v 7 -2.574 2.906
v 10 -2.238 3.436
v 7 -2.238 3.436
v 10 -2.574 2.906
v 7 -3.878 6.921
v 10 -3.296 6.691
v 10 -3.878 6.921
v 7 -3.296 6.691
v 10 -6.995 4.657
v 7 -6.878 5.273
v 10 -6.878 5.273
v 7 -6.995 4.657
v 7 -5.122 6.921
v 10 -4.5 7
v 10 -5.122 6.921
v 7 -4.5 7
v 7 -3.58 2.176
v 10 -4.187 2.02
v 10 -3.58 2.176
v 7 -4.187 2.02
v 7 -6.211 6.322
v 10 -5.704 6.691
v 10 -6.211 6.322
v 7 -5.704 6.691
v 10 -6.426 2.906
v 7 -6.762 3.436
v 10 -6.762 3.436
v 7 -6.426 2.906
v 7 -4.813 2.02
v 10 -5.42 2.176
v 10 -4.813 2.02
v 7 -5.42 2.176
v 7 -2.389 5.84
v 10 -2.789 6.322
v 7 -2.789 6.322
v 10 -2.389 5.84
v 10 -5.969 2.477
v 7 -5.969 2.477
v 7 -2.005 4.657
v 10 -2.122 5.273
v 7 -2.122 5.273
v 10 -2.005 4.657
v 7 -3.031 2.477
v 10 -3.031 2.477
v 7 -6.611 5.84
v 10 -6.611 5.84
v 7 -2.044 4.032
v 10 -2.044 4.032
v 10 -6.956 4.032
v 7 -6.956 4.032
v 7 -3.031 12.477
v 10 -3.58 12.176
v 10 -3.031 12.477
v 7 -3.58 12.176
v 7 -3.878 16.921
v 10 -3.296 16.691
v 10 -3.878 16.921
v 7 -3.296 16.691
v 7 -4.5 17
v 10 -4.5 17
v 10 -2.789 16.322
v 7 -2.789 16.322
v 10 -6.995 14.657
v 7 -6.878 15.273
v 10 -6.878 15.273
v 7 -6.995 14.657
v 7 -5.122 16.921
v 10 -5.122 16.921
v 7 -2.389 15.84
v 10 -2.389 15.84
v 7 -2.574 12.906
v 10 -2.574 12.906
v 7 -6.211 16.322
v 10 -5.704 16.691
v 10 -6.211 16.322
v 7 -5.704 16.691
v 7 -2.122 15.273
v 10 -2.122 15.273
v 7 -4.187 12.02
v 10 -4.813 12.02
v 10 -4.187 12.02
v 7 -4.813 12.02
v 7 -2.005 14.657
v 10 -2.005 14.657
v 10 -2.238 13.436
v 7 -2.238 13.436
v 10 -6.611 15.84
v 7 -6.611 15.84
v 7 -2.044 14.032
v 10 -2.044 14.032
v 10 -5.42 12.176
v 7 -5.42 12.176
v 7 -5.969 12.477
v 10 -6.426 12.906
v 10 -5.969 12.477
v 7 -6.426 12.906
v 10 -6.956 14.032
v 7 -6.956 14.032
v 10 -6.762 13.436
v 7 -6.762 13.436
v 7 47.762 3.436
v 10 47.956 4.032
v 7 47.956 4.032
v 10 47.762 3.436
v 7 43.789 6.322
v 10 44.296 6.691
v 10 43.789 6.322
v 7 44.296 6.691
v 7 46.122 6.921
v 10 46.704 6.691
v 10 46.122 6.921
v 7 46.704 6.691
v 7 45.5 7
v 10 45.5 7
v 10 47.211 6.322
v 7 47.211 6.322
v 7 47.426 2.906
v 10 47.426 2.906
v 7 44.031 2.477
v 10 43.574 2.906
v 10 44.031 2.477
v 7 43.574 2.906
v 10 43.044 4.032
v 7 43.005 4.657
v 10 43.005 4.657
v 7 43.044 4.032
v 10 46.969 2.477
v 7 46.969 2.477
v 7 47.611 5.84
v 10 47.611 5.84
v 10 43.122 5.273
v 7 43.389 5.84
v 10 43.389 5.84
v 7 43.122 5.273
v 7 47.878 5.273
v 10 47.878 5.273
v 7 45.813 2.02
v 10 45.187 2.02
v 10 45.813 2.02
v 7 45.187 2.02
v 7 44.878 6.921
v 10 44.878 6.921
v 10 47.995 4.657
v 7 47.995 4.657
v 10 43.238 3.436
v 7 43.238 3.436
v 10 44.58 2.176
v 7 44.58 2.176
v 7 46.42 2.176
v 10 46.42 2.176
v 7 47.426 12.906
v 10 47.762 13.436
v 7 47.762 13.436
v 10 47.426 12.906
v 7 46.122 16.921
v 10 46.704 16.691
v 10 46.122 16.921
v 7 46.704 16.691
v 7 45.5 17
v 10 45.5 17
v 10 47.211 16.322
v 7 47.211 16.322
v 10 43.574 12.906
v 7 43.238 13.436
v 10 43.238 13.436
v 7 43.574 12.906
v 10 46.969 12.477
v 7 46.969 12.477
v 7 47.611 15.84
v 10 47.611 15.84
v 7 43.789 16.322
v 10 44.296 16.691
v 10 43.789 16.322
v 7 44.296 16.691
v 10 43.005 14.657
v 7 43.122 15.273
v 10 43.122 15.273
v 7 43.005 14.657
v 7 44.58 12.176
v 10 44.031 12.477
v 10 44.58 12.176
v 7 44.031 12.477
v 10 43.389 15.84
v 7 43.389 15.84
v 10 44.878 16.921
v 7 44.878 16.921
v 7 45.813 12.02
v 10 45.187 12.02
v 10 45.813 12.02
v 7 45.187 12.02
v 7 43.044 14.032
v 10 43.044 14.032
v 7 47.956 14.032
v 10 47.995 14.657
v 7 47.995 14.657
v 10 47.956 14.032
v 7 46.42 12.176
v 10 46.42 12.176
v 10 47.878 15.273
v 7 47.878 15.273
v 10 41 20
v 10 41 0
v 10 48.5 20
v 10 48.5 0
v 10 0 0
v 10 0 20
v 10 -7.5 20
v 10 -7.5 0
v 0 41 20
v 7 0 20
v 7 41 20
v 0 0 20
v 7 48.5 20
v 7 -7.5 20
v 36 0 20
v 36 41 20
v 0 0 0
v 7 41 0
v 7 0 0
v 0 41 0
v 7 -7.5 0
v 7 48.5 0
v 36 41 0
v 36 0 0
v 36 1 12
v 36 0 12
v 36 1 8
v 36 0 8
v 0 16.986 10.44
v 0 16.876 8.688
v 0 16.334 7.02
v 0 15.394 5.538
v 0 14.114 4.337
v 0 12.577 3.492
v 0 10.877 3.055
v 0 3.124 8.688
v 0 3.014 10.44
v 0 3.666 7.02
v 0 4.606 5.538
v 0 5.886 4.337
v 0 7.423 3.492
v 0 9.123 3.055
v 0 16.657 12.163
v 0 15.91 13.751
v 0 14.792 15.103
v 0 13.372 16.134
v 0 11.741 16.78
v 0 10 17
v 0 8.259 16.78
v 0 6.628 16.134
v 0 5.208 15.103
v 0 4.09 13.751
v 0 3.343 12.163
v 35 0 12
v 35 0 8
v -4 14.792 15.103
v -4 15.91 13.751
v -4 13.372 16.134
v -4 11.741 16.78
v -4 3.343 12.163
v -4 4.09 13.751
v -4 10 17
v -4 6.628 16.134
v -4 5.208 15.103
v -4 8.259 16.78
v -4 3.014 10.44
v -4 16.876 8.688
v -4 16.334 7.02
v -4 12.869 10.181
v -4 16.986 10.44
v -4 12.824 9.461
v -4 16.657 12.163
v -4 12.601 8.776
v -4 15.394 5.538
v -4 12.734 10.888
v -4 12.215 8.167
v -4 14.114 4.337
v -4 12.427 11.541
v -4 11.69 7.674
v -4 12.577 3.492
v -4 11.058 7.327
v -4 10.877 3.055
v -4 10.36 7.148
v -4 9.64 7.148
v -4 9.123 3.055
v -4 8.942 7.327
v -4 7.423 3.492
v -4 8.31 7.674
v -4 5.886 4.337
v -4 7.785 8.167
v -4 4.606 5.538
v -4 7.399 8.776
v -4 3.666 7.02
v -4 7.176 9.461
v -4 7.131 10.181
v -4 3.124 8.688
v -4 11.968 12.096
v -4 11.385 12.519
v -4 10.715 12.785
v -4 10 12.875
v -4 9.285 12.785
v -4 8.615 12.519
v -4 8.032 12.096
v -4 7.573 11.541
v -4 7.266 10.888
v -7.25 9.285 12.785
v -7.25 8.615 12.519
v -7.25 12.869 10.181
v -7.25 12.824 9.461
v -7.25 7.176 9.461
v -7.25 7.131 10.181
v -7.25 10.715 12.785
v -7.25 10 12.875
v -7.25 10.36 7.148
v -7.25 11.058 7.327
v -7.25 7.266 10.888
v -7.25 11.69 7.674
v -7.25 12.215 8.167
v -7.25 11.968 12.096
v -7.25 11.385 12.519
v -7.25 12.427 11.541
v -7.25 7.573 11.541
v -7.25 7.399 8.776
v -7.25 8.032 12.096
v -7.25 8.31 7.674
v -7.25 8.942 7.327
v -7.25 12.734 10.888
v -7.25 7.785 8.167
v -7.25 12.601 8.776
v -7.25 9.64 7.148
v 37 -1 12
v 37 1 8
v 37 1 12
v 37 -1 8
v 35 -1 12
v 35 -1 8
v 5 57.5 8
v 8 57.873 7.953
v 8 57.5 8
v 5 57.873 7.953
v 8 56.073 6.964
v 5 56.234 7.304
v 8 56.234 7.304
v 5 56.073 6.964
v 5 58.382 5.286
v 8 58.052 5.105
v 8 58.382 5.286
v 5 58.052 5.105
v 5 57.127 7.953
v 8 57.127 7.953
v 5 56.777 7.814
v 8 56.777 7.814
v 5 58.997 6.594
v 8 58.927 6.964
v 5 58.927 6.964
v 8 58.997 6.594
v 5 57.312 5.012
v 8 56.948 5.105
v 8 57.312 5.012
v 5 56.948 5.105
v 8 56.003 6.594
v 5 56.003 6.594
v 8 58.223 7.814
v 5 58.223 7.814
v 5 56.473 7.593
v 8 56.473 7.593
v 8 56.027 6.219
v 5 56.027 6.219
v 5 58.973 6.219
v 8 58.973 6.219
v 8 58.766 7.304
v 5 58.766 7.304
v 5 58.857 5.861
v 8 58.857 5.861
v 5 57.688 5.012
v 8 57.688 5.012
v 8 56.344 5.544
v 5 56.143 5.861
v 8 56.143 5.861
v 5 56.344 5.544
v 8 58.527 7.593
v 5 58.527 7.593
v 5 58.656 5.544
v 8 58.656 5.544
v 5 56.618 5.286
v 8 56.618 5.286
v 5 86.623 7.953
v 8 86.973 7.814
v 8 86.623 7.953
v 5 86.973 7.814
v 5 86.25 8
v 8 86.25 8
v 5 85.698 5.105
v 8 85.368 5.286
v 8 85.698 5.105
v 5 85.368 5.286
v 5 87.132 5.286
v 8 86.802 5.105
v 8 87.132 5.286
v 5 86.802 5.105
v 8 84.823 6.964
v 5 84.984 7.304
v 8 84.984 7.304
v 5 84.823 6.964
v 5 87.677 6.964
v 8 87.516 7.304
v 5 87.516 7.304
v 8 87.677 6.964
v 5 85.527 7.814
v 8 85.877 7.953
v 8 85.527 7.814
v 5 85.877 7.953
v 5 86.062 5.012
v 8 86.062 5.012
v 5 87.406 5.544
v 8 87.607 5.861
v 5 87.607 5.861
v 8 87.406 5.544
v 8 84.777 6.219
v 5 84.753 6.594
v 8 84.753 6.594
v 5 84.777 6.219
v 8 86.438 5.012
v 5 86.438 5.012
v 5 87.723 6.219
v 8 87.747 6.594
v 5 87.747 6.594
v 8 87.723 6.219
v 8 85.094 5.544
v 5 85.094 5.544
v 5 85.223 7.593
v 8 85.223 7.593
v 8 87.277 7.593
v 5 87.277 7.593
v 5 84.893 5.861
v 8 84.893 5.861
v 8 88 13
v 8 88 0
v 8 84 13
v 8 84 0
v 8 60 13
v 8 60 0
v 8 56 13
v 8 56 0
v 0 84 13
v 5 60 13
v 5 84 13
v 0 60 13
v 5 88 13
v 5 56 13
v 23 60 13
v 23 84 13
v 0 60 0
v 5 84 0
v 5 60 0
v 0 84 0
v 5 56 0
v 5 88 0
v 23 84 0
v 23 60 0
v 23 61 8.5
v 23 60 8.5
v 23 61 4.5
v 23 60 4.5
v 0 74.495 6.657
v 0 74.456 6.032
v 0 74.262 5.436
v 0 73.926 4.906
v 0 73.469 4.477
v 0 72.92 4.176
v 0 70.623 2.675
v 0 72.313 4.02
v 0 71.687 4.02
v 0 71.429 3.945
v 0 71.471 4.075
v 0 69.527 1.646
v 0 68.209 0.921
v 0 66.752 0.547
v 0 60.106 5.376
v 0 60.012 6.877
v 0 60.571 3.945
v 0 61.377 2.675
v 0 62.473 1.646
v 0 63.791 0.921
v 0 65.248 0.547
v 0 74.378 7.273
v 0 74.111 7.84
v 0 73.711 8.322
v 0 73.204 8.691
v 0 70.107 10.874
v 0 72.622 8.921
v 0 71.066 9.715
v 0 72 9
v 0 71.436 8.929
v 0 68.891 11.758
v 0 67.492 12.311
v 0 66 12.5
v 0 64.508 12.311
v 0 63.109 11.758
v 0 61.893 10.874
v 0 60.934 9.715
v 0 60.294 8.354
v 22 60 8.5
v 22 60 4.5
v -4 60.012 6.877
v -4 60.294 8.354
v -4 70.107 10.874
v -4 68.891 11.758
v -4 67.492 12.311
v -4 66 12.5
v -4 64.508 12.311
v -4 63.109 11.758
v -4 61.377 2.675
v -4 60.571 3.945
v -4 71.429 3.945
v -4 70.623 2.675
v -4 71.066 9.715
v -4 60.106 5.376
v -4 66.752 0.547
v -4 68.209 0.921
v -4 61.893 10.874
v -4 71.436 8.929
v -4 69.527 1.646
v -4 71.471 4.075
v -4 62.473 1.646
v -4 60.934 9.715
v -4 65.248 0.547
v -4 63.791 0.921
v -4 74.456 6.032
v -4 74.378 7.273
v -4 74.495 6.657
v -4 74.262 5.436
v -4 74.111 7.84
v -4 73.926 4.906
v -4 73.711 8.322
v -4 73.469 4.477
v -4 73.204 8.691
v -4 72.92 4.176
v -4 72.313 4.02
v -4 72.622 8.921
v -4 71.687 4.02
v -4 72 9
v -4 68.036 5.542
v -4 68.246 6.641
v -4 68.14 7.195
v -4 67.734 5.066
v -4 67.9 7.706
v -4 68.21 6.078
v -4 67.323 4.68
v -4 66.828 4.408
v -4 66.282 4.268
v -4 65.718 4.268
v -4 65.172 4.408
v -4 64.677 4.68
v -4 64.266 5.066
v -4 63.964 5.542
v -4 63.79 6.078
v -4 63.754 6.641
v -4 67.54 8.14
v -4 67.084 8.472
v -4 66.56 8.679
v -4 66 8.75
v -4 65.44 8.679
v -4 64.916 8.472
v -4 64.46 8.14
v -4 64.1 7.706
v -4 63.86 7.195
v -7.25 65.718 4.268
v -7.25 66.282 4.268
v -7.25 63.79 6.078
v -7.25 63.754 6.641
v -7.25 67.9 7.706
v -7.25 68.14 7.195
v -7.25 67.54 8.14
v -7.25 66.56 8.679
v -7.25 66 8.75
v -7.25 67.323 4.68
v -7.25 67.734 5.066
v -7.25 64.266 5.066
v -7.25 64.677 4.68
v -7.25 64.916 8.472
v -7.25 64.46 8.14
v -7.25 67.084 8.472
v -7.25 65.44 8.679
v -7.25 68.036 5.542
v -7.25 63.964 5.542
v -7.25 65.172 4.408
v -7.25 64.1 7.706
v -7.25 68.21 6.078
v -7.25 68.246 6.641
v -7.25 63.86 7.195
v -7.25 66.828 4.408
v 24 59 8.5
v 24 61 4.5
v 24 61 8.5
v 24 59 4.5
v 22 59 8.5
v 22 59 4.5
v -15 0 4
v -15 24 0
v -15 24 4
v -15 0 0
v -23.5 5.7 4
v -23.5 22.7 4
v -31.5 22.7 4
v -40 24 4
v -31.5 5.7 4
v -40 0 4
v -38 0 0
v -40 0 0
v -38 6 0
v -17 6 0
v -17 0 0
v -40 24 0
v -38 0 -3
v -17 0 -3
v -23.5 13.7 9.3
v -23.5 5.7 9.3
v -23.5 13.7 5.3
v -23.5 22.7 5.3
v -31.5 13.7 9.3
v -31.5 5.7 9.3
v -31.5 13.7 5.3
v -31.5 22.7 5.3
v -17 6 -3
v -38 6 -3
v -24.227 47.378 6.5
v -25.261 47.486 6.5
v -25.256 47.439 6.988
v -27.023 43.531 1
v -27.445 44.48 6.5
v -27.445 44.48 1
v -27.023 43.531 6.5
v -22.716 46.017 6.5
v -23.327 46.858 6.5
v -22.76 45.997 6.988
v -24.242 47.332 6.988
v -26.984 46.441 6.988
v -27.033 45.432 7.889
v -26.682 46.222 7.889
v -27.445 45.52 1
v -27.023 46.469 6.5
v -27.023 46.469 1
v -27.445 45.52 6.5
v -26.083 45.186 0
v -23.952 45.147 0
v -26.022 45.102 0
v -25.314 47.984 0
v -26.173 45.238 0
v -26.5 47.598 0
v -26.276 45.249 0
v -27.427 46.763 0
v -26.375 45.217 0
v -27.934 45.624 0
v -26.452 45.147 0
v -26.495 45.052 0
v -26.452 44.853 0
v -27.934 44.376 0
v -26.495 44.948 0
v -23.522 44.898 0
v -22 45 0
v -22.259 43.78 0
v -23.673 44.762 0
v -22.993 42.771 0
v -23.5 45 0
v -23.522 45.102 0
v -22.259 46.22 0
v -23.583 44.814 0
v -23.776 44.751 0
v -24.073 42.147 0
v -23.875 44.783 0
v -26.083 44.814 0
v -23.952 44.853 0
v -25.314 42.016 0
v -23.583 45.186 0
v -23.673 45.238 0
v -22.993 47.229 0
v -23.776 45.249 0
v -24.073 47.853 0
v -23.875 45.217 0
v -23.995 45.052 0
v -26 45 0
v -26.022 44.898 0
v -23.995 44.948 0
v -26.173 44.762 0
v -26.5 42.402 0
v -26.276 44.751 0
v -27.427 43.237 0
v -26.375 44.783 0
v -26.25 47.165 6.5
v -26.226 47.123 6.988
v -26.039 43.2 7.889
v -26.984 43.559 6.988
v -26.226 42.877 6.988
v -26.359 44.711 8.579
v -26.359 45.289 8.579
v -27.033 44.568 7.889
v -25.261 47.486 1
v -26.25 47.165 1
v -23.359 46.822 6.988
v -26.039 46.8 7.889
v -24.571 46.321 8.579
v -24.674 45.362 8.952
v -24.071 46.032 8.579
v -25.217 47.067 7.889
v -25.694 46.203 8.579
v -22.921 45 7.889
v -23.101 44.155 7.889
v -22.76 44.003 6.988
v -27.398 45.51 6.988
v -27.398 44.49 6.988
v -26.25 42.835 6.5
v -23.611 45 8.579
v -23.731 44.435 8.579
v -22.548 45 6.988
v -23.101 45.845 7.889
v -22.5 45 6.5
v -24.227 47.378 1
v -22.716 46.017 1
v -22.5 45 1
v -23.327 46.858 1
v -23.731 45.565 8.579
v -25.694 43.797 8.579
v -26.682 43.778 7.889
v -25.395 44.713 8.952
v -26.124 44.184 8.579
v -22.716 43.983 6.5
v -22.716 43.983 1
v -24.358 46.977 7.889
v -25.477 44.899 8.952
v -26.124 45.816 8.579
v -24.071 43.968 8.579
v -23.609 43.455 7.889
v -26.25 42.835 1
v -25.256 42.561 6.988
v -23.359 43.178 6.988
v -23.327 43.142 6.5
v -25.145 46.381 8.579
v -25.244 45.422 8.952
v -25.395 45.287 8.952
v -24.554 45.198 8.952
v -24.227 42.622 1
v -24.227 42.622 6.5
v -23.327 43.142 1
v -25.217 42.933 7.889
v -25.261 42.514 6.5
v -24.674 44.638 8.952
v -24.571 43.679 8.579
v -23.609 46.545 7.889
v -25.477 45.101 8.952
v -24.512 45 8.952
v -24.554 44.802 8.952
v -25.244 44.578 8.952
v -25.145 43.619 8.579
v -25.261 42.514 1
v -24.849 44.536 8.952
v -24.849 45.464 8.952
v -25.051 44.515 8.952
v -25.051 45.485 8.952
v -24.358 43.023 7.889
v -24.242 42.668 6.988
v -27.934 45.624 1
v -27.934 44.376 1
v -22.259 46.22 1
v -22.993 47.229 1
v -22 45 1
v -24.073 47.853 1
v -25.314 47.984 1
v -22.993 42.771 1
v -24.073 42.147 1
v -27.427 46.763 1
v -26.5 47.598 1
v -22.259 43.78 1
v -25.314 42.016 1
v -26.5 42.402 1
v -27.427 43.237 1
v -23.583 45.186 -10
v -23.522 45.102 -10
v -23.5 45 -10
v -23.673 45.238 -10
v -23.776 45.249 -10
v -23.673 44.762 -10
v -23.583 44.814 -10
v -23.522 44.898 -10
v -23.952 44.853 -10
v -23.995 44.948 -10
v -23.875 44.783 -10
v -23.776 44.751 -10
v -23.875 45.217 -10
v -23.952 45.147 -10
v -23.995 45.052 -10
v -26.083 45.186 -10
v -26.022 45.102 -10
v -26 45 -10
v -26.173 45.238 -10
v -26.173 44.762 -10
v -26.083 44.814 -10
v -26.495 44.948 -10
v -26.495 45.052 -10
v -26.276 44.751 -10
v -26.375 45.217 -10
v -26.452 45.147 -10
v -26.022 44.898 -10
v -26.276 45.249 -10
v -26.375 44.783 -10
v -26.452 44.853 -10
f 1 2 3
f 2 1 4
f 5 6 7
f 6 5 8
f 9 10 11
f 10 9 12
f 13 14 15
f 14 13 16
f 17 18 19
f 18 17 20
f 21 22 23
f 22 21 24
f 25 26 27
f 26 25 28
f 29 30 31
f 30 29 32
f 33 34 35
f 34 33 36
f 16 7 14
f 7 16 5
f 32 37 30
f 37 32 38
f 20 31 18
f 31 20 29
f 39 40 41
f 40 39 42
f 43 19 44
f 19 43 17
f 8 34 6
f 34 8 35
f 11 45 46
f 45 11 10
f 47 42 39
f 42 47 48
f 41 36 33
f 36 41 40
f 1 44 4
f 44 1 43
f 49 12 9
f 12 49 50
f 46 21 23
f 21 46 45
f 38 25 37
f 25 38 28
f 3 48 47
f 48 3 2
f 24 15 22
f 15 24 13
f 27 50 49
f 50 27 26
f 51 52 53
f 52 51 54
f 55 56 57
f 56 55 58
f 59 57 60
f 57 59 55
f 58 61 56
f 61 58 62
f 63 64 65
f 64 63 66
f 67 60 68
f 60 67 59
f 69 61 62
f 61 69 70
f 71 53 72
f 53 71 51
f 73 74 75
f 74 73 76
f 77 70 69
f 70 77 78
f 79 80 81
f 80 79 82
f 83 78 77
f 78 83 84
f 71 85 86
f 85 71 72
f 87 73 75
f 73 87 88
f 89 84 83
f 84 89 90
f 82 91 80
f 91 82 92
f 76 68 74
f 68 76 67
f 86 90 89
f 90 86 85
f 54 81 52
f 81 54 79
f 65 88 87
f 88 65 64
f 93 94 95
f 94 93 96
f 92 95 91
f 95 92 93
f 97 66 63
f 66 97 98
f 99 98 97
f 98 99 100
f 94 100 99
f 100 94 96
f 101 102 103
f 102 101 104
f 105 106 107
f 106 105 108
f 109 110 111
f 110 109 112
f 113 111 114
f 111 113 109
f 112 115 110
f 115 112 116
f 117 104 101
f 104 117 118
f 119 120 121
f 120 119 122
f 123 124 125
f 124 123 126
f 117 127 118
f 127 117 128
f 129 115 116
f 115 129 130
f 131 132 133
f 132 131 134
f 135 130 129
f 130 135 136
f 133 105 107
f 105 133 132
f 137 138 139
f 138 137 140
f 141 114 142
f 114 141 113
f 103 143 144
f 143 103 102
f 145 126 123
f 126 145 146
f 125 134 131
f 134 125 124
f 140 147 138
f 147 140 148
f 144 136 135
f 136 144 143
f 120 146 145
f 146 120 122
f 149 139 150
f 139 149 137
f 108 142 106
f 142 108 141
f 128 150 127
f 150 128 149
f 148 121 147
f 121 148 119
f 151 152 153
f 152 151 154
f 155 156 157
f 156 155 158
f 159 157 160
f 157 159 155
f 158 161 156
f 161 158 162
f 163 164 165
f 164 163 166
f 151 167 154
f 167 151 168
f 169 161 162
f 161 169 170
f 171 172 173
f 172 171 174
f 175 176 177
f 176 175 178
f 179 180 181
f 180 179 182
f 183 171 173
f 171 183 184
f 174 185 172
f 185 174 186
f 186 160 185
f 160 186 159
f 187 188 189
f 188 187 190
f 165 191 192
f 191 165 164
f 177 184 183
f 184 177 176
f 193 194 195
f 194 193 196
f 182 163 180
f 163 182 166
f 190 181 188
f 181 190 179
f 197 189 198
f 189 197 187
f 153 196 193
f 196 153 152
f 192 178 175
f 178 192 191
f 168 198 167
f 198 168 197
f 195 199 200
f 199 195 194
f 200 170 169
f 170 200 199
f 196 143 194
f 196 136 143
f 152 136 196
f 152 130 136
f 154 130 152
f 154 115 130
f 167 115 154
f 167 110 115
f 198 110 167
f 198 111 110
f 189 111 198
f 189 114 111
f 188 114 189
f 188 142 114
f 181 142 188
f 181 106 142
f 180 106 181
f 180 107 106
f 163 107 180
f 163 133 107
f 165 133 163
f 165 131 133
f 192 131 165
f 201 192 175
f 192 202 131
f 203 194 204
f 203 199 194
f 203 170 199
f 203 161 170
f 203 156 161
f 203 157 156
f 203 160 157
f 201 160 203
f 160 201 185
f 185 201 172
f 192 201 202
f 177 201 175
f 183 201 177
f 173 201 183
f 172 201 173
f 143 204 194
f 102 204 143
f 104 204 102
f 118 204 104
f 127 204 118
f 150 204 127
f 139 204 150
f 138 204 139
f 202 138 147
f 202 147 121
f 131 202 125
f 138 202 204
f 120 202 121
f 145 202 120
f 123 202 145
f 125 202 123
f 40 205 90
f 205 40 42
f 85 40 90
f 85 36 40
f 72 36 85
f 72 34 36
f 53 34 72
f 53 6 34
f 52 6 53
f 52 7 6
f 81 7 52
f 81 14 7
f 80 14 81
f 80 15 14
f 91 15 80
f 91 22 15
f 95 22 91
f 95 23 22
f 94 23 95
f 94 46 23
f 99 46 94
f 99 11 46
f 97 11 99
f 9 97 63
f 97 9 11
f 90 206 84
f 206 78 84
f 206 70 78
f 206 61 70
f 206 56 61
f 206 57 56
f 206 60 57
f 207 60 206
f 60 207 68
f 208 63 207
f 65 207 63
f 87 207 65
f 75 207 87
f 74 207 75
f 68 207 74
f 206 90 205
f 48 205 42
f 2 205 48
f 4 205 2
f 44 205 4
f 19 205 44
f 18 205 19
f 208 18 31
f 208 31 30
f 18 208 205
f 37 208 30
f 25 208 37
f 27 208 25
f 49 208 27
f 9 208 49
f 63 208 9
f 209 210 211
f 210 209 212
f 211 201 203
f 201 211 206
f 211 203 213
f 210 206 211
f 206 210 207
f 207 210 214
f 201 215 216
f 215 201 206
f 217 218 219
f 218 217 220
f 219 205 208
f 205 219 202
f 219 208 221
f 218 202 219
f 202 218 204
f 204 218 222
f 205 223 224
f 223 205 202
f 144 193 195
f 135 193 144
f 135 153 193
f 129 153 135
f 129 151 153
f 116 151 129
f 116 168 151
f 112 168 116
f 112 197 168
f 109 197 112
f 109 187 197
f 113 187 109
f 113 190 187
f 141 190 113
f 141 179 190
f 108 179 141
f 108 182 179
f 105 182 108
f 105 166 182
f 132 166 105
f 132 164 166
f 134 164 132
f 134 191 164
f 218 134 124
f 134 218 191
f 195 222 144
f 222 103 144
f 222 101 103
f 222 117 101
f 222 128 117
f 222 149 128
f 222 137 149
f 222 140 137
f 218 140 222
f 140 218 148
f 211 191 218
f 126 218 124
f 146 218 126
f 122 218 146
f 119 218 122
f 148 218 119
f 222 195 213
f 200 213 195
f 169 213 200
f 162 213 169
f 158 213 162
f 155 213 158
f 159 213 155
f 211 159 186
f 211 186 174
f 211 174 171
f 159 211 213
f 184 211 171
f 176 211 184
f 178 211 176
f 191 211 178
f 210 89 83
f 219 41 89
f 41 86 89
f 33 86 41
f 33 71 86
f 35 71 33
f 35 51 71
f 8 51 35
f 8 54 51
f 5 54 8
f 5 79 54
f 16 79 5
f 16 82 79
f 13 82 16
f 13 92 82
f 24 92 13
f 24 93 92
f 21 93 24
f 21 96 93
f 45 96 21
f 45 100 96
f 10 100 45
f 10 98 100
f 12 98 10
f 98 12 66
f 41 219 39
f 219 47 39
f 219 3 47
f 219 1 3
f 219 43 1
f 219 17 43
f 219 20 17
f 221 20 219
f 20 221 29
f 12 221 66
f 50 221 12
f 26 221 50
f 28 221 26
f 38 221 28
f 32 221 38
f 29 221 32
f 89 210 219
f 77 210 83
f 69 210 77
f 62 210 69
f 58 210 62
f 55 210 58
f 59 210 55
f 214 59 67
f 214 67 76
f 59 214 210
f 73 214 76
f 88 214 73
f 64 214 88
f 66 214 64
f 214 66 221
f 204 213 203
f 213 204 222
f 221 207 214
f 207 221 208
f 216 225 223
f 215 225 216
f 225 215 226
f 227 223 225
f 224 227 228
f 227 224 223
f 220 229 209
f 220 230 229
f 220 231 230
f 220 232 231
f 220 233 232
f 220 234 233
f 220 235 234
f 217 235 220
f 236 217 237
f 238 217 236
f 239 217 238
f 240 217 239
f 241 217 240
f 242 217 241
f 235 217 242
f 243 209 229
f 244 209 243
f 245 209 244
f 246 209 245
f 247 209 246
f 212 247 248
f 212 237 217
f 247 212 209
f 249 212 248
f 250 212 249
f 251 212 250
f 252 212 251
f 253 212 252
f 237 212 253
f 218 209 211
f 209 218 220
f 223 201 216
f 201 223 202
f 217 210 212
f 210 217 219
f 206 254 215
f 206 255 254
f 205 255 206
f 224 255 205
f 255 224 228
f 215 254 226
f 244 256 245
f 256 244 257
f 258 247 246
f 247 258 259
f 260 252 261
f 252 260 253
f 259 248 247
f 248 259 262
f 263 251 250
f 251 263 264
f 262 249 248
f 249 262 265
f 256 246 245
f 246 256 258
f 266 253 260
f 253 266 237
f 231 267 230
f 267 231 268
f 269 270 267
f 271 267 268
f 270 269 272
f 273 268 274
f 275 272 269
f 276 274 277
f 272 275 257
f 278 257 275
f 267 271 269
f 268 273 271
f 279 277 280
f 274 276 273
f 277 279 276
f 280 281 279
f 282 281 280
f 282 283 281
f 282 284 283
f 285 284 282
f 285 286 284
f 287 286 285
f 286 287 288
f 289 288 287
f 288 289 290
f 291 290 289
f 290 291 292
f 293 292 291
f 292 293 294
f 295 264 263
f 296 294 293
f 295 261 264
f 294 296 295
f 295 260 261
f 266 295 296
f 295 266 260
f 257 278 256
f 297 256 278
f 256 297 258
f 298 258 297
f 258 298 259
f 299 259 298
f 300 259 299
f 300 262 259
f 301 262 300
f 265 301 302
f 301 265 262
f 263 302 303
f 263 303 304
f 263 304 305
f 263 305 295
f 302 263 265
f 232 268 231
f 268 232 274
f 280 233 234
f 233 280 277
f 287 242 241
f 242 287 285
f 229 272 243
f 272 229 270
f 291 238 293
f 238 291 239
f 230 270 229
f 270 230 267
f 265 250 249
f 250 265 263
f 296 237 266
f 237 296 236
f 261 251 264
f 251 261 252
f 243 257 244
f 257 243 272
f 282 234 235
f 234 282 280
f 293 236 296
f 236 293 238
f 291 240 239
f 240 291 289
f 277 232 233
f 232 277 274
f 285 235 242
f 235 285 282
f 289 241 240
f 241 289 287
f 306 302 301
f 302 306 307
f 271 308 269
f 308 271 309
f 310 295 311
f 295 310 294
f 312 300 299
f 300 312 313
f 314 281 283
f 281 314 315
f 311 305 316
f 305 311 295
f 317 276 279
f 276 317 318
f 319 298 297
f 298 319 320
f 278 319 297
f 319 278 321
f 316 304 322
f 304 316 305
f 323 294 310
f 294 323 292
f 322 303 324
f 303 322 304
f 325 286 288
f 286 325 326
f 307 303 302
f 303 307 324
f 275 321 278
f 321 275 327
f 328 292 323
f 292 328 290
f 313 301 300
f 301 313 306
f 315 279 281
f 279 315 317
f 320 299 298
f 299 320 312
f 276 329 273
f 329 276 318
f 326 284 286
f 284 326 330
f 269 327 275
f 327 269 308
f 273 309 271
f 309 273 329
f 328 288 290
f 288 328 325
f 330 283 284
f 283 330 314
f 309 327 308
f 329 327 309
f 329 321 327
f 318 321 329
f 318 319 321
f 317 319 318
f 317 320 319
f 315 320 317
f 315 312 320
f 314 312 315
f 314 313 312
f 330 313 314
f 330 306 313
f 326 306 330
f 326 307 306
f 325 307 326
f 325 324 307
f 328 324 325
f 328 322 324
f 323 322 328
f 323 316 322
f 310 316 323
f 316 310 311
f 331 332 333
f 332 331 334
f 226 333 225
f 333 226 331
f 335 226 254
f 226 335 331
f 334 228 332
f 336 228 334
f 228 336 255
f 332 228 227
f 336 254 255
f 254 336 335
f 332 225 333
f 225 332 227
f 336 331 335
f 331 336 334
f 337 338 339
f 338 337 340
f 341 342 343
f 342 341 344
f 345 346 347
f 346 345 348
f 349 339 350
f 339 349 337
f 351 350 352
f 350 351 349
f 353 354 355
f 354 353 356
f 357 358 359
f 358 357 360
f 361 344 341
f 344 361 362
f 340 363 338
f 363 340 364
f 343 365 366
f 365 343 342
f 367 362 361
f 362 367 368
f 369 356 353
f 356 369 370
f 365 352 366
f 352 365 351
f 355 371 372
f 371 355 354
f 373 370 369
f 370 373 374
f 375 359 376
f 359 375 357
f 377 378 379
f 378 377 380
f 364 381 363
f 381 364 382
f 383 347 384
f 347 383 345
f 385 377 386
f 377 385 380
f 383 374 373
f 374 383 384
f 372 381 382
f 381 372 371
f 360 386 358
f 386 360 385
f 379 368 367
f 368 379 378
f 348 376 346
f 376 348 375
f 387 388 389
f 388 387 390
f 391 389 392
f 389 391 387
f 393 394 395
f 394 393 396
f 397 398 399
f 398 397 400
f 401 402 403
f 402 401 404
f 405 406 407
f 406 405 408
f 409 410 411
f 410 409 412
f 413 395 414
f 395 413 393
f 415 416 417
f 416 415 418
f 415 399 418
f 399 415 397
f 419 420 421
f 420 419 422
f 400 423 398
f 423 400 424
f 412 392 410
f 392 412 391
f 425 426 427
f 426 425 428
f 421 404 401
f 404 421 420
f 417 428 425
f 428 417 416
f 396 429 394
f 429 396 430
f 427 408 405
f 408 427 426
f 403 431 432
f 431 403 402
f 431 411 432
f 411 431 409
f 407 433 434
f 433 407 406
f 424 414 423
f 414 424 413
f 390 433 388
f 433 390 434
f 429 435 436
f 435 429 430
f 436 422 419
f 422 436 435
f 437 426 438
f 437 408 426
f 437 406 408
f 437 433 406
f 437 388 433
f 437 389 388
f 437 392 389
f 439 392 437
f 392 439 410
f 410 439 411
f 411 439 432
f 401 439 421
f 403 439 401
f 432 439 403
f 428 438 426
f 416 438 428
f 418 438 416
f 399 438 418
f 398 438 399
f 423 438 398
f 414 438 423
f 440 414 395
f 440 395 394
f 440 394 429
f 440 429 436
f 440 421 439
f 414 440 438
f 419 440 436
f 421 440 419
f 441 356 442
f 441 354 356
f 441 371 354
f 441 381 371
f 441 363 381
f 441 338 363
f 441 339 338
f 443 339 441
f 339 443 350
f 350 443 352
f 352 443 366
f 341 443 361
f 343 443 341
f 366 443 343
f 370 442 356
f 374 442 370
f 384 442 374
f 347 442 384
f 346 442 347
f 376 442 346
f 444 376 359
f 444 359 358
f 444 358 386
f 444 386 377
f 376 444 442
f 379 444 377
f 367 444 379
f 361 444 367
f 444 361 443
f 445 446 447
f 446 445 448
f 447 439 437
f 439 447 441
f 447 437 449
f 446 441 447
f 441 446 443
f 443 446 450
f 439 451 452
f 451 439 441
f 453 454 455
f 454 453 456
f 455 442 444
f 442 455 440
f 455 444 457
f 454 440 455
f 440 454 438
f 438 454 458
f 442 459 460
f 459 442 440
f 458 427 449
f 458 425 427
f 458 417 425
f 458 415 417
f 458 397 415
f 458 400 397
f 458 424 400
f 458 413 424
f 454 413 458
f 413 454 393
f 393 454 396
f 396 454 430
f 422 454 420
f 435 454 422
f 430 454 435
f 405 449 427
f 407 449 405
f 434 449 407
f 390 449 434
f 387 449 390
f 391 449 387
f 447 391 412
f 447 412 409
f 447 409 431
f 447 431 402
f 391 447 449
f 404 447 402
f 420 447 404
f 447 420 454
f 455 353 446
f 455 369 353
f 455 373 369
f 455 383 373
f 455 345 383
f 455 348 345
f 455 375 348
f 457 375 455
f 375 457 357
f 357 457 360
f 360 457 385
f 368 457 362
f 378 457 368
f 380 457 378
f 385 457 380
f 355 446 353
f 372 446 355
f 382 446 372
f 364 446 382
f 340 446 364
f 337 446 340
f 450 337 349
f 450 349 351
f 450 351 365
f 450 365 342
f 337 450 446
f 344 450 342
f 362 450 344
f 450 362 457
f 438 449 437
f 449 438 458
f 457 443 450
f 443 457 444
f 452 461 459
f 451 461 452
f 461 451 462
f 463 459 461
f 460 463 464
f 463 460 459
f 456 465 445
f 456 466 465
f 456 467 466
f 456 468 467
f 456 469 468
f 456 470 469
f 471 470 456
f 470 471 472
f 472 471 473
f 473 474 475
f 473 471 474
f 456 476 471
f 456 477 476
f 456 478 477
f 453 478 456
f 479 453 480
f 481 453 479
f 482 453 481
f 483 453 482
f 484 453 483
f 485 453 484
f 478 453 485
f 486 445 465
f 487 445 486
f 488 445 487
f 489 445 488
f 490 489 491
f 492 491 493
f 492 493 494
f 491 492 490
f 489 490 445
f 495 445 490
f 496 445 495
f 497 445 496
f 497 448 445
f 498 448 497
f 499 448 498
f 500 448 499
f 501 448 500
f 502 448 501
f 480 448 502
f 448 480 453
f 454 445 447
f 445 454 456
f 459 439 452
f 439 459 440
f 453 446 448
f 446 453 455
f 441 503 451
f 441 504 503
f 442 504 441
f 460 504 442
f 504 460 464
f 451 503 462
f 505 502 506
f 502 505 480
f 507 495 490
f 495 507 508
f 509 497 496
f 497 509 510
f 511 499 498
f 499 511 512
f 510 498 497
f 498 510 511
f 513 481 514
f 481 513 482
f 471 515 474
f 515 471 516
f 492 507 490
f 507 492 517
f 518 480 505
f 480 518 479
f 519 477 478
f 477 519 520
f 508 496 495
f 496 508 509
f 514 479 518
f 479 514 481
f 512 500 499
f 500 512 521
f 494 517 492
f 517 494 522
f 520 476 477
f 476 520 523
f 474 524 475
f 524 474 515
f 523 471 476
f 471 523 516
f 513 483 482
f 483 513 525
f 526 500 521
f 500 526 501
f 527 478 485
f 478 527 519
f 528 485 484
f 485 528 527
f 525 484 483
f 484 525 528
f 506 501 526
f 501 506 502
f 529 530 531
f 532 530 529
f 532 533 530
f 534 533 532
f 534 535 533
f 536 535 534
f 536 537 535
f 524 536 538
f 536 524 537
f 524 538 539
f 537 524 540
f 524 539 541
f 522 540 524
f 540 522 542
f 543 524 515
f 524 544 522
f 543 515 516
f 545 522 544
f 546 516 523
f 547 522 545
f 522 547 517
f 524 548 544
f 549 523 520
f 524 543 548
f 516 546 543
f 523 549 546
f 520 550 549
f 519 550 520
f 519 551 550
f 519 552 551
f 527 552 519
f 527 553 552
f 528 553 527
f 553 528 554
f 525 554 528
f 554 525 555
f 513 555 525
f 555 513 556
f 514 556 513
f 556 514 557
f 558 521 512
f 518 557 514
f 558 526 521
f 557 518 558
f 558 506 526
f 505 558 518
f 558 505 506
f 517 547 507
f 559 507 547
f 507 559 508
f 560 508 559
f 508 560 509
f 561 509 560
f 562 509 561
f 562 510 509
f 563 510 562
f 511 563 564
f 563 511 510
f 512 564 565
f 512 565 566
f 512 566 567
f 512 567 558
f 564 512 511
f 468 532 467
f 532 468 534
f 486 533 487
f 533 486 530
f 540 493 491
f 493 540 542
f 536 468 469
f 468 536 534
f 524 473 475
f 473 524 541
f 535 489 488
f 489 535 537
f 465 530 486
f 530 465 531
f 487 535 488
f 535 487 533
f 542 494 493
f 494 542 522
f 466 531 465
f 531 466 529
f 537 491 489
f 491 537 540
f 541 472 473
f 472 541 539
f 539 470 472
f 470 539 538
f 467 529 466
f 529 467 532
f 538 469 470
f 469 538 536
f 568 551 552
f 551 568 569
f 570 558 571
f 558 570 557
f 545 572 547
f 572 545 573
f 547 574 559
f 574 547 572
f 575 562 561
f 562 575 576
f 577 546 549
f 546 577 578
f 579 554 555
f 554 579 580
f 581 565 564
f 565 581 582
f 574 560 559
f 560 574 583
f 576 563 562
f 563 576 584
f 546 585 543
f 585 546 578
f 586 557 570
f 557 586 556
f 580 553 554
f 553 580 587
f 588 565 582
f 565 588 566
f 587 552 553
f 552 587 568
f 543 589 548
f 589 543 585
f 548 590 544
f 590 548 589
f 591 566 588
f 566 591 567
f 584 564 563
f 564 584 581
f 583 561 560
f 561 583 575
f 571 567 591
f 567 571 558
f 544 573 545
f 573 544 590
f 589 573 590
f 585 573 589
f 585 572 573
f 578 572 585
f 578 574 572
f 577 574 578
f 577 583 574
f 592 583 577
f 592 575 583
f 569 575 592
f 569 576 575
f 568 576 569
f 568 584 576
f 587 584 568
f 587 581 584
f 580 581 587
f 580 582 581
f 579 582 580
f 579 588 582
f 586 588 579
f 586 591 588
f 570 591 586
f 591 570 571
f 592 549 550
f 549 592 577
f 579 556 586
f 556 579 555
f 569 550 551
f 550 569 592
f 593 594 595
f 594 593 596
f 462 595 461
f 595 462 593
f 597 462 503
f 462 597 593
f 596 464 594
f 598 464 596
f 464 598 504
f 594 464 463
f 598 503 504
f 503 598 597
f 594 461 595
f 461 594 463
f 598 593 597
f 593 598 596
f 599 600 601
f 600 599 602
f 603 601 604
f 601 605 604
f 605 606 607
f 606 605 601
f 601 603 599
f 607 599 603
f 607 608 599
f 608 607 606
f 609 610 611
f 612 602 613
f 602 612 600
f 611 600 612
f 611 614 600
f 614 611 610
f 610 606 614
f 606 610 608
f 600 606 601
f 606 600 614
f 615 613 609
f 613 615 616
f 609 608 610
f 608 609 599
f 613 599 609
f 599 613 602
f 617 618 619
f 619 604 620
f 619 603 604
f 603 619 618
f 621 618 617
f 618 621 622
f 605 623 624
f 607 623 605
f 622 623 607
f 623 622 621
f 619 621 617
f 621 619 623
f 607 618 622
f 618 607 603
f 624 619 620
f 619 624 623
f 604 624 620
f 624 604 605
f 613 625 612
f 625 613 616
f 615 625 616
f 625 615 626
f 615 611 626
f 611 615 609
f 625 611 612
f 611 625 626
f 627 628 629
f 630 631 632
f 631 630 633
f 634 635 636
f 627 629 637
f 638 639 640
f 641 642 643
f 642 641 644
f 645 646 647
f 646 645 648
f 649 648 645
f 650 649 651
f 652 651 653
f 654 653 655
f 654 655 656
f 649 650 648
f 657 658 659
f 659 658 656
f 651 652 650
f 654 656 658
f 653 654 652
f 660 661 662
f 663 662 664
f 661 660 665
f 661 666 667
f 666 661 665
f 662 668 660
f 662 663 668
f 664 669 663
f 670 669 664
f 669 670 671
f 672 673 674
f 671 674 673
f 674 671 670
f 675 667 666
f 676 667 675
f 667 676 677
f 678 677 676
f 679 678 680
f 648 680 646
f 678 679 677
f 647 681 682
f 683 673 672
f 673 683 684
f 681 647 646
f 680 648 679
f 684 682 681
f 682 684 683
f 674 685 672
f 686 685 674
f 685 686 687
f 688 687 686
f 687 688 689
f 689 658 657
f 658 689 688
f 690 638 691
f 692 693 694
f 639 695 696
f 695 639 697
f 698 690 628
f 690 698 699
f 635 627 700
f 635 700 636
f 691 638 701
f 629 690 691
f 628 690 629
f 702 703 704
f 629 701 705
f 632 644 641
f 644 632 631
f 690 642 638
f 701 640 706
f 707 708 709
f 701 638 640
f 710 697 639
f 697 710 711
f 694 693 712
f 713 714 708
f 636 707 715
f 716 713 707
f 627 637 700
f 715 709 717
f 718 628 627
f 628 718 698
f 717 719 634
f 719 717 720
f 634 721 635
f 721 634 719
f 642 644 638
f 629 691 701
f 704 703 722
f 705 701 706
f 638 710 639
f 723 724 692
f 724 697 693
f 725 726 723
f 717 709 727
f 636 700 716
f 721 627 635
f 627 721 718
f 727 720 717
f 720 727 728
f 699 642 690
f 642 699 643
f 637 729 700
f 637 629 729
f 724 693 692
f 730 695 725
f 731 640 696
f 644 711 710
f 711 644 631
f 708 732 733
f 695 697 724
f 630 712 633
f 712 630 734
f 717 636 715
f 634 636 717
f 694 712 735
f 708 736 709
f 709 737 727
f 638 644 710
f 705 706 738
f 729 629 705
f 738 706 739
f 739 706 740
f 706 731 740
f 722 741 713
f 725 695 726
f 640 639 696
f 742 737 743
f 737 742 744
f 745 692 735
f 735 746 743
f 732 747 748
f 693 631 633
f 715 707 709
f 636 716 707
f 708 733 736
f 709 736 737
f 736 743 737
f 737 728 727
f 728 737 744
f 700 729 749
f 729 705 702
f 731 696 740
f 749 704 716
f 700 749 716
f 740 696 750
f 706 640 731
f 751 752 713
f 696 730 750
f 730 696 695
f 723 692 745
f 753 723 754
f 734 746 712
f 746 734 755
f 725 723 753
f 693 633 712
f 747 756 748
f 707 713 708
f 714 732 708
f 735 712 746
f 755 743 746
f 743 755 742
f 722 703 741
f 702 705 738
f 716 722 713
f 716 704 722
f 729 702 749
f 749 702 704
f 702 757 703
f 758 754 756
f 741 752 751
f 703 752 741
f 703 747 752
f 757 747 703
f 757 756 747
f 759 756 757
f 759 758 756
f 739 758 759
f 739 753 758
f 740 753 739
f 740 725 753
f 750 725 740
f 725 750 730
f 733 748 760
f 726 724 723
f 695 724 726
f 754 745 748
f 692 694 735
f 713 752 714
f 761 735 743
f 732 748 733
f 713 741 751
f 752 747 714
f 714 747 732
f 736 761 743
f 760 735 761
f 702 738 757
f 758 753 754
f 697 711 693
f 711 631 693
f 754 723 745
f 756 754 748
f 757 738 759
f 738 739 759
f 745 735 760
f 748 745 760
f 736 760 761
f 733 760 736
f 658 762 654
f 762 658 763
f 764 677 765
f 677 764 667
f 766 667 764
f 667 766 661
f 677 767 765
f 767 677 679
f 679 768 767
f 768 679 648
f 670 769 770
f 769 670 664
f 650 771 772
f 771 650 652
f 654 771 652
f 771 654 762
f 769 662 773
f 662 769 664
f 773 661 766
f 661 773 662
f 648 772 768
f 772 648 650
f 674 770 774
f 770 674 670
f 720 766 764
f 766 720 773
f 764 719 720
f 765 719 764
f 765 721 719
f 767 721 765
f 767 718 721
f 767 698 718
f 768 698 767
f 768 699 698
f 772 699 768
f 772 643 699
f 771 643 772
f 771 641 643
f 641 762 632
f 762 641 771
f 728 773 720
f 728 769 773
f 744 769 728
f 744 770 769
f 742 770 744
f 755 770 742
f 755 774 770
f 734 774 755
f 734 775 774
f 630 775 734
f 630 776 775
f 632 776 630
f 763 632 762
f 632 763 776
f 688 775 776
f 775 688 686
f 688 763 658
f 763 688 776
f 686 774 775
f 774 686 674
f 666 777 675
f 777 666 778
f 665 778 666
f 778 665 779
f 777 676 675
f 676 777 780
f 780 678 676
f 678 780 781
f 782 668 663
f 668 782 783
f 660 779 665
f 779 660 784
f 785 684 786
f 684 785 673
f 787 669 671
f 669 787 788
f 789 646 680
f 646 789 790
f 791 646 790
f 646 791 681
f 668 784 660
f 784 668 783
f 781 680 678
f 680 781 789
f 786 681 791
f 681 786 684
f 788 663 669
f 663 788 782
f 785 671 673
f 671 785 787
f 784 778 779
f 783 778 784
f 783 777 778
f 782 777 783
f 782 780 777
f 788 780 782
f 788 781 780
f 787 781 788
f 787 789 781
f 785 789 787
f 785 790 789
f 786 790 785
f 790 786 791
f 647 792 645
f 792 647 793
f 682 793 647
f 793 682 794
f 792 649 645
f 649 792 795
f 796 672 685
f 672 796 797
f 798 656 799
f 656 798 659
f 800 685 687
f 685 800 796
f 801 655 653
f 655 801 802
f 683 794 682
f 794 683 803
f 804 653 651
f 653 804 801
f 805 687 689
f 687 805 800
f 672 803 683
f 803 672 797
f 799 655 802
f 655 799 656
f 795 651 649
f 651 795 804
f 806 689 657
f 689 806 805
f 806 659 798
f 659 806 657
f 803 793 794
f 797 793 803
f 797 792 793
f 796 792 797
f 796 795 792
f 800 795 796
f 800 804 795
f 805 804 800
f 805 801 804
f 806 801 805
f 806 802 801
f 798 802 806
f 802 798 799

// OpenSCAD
servo();

translate([0, 60])
micro_servo();

translate([-40, 0])
raspberry_pi_cam();

translate([-25, 45])
led_5mm();

module led_5mm() {
    $fn = 15;

    hull() {
        translate([0, 0, 6.5])
        sphere(d = 5);
        cylinder(h = 6.5, d = 5);
    }

    cylinder(h = 1, d = 6);

    translate([1.25, 0, -10])
    cylinder(h = 10, d = 0.5);

    translate([-1.25, 0, -10])
    cylinder(h = 10, d = 0.5);
}

module raspberry_pi_cam() {
    cube([25, 24, 4]);
    translate([25/2 - 8/2, 5.7, 4])
    cube([8, 8, 5.3]);
    translate([25/2 - 8/2, 5.7+8, 4])
    cube([8, 9, 1.3]);
    translate([25/2 - 21/2, 0, -3])
    cube([21, 6, 3]);
}

module micro_servo() {
    body();
    output_shaft();
    cable();

    height = 13;
    depth = 23;

    module body() {
        $fn = 25;

        cube([depth, 24, height]);

        difference() {
            offset = 5;
            translate([offset, -(32-24)/2])
            cube([3, 32, height]);

            translate([offset+3+0.5, -2.5, height/2])
            rotate([0, -90])
            union() {
                cylinder(h = 4, d = 3);
                translate([0, 28.75])
                cylinder(h = 4, d = 3);
            }
        }

        translate([0, 12/2, height/2])
        rotate([0, -90])
        cylinder(h = 4, d = 12);

        translate([0, 12, height/2])
        rotate([0, -90])
        cylinder(h = 4, d = 5);
    }

    module output_shaft() {
        $fn = 25;
        translate([-4, 12/2, height/2])
        rotate([0, -90])
        cylinder(h = 3.25, d = 4.5);
    }

    module cable() {
        translate([depth-1, -1, height/2 - 4/2])
        cube([2, 2, 4]);
    }
}

module servo() {
    body();
    output_shaft();
    cable();

    height = 20;
    depth = 36;

    module body() {
        $fn = 25;

        cube([depth, 41, height]);

        difference() {
            offset = 7;
            translate([offset, -(56-41)/2])
            cube([3, 56, height]);

            translate([offset+3+0.5, -4.5, 2+5/2])
            rotate([0, -90])
            union() {
                cylinder(h = 4, d = 5);

                translate([10, 0, 0])
                cylinder(h = 4, d = 5);

                translate([0, 50])
                cylinder(h = 4, d = 5);

                translate([10, 50])
                cylinder(h = 4, d = 5);
            }
        }

        translate([0, 10, height/2])
        rotate([0, -90])
        cylinder(h = 4, d = 14);
    }

    module output_shaft() {
        $fn = 25;
        translate([-4, 10, height/2])
        rotate([0, -90])
        cylinder(h = 3.25, d = 5.75);
    }

    module cable() {
        translate([depth-1, -1, height/2 - 4/2])
        cube([2, 2, 4]);
    }
}
